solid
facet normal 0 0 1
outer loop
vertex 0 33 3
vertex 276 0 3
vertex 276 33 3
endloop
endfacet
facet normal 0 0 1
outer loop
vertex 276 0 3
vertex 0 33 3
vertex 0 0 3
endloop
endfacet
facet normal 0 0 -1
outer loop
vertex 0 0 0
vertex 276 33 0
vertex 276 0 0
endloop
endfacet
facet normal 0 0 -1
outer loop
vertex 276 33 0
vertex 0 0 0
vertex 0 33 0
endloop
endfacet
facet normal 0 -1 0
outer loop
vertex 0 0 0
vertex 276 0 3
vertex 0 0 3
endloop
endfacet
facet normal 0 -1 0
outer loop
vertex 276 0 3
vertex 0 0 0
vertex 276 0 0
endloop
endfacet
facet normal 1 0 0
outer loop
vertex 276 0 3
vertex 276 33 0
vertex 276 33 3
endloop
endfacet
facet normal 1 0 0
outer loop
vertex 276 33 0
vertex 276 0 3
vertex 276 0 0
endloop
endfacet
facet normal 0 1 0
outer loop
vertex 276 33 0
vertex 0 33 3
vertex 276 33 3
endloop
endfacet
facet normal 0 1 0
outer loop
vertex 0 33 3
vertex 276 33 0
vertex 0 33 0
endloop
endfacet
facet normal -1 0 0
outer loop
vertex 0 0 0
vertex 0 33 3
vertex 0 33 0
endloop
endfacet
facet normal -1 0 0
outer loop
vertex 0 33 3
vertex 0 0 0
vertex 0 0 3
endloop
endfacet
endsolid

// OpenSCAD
// box parameters
box_x = 276;
box_y = 208;
box_z = 33;

module test()
{
    cube([box_x, box_z, 3]);
}

test();
